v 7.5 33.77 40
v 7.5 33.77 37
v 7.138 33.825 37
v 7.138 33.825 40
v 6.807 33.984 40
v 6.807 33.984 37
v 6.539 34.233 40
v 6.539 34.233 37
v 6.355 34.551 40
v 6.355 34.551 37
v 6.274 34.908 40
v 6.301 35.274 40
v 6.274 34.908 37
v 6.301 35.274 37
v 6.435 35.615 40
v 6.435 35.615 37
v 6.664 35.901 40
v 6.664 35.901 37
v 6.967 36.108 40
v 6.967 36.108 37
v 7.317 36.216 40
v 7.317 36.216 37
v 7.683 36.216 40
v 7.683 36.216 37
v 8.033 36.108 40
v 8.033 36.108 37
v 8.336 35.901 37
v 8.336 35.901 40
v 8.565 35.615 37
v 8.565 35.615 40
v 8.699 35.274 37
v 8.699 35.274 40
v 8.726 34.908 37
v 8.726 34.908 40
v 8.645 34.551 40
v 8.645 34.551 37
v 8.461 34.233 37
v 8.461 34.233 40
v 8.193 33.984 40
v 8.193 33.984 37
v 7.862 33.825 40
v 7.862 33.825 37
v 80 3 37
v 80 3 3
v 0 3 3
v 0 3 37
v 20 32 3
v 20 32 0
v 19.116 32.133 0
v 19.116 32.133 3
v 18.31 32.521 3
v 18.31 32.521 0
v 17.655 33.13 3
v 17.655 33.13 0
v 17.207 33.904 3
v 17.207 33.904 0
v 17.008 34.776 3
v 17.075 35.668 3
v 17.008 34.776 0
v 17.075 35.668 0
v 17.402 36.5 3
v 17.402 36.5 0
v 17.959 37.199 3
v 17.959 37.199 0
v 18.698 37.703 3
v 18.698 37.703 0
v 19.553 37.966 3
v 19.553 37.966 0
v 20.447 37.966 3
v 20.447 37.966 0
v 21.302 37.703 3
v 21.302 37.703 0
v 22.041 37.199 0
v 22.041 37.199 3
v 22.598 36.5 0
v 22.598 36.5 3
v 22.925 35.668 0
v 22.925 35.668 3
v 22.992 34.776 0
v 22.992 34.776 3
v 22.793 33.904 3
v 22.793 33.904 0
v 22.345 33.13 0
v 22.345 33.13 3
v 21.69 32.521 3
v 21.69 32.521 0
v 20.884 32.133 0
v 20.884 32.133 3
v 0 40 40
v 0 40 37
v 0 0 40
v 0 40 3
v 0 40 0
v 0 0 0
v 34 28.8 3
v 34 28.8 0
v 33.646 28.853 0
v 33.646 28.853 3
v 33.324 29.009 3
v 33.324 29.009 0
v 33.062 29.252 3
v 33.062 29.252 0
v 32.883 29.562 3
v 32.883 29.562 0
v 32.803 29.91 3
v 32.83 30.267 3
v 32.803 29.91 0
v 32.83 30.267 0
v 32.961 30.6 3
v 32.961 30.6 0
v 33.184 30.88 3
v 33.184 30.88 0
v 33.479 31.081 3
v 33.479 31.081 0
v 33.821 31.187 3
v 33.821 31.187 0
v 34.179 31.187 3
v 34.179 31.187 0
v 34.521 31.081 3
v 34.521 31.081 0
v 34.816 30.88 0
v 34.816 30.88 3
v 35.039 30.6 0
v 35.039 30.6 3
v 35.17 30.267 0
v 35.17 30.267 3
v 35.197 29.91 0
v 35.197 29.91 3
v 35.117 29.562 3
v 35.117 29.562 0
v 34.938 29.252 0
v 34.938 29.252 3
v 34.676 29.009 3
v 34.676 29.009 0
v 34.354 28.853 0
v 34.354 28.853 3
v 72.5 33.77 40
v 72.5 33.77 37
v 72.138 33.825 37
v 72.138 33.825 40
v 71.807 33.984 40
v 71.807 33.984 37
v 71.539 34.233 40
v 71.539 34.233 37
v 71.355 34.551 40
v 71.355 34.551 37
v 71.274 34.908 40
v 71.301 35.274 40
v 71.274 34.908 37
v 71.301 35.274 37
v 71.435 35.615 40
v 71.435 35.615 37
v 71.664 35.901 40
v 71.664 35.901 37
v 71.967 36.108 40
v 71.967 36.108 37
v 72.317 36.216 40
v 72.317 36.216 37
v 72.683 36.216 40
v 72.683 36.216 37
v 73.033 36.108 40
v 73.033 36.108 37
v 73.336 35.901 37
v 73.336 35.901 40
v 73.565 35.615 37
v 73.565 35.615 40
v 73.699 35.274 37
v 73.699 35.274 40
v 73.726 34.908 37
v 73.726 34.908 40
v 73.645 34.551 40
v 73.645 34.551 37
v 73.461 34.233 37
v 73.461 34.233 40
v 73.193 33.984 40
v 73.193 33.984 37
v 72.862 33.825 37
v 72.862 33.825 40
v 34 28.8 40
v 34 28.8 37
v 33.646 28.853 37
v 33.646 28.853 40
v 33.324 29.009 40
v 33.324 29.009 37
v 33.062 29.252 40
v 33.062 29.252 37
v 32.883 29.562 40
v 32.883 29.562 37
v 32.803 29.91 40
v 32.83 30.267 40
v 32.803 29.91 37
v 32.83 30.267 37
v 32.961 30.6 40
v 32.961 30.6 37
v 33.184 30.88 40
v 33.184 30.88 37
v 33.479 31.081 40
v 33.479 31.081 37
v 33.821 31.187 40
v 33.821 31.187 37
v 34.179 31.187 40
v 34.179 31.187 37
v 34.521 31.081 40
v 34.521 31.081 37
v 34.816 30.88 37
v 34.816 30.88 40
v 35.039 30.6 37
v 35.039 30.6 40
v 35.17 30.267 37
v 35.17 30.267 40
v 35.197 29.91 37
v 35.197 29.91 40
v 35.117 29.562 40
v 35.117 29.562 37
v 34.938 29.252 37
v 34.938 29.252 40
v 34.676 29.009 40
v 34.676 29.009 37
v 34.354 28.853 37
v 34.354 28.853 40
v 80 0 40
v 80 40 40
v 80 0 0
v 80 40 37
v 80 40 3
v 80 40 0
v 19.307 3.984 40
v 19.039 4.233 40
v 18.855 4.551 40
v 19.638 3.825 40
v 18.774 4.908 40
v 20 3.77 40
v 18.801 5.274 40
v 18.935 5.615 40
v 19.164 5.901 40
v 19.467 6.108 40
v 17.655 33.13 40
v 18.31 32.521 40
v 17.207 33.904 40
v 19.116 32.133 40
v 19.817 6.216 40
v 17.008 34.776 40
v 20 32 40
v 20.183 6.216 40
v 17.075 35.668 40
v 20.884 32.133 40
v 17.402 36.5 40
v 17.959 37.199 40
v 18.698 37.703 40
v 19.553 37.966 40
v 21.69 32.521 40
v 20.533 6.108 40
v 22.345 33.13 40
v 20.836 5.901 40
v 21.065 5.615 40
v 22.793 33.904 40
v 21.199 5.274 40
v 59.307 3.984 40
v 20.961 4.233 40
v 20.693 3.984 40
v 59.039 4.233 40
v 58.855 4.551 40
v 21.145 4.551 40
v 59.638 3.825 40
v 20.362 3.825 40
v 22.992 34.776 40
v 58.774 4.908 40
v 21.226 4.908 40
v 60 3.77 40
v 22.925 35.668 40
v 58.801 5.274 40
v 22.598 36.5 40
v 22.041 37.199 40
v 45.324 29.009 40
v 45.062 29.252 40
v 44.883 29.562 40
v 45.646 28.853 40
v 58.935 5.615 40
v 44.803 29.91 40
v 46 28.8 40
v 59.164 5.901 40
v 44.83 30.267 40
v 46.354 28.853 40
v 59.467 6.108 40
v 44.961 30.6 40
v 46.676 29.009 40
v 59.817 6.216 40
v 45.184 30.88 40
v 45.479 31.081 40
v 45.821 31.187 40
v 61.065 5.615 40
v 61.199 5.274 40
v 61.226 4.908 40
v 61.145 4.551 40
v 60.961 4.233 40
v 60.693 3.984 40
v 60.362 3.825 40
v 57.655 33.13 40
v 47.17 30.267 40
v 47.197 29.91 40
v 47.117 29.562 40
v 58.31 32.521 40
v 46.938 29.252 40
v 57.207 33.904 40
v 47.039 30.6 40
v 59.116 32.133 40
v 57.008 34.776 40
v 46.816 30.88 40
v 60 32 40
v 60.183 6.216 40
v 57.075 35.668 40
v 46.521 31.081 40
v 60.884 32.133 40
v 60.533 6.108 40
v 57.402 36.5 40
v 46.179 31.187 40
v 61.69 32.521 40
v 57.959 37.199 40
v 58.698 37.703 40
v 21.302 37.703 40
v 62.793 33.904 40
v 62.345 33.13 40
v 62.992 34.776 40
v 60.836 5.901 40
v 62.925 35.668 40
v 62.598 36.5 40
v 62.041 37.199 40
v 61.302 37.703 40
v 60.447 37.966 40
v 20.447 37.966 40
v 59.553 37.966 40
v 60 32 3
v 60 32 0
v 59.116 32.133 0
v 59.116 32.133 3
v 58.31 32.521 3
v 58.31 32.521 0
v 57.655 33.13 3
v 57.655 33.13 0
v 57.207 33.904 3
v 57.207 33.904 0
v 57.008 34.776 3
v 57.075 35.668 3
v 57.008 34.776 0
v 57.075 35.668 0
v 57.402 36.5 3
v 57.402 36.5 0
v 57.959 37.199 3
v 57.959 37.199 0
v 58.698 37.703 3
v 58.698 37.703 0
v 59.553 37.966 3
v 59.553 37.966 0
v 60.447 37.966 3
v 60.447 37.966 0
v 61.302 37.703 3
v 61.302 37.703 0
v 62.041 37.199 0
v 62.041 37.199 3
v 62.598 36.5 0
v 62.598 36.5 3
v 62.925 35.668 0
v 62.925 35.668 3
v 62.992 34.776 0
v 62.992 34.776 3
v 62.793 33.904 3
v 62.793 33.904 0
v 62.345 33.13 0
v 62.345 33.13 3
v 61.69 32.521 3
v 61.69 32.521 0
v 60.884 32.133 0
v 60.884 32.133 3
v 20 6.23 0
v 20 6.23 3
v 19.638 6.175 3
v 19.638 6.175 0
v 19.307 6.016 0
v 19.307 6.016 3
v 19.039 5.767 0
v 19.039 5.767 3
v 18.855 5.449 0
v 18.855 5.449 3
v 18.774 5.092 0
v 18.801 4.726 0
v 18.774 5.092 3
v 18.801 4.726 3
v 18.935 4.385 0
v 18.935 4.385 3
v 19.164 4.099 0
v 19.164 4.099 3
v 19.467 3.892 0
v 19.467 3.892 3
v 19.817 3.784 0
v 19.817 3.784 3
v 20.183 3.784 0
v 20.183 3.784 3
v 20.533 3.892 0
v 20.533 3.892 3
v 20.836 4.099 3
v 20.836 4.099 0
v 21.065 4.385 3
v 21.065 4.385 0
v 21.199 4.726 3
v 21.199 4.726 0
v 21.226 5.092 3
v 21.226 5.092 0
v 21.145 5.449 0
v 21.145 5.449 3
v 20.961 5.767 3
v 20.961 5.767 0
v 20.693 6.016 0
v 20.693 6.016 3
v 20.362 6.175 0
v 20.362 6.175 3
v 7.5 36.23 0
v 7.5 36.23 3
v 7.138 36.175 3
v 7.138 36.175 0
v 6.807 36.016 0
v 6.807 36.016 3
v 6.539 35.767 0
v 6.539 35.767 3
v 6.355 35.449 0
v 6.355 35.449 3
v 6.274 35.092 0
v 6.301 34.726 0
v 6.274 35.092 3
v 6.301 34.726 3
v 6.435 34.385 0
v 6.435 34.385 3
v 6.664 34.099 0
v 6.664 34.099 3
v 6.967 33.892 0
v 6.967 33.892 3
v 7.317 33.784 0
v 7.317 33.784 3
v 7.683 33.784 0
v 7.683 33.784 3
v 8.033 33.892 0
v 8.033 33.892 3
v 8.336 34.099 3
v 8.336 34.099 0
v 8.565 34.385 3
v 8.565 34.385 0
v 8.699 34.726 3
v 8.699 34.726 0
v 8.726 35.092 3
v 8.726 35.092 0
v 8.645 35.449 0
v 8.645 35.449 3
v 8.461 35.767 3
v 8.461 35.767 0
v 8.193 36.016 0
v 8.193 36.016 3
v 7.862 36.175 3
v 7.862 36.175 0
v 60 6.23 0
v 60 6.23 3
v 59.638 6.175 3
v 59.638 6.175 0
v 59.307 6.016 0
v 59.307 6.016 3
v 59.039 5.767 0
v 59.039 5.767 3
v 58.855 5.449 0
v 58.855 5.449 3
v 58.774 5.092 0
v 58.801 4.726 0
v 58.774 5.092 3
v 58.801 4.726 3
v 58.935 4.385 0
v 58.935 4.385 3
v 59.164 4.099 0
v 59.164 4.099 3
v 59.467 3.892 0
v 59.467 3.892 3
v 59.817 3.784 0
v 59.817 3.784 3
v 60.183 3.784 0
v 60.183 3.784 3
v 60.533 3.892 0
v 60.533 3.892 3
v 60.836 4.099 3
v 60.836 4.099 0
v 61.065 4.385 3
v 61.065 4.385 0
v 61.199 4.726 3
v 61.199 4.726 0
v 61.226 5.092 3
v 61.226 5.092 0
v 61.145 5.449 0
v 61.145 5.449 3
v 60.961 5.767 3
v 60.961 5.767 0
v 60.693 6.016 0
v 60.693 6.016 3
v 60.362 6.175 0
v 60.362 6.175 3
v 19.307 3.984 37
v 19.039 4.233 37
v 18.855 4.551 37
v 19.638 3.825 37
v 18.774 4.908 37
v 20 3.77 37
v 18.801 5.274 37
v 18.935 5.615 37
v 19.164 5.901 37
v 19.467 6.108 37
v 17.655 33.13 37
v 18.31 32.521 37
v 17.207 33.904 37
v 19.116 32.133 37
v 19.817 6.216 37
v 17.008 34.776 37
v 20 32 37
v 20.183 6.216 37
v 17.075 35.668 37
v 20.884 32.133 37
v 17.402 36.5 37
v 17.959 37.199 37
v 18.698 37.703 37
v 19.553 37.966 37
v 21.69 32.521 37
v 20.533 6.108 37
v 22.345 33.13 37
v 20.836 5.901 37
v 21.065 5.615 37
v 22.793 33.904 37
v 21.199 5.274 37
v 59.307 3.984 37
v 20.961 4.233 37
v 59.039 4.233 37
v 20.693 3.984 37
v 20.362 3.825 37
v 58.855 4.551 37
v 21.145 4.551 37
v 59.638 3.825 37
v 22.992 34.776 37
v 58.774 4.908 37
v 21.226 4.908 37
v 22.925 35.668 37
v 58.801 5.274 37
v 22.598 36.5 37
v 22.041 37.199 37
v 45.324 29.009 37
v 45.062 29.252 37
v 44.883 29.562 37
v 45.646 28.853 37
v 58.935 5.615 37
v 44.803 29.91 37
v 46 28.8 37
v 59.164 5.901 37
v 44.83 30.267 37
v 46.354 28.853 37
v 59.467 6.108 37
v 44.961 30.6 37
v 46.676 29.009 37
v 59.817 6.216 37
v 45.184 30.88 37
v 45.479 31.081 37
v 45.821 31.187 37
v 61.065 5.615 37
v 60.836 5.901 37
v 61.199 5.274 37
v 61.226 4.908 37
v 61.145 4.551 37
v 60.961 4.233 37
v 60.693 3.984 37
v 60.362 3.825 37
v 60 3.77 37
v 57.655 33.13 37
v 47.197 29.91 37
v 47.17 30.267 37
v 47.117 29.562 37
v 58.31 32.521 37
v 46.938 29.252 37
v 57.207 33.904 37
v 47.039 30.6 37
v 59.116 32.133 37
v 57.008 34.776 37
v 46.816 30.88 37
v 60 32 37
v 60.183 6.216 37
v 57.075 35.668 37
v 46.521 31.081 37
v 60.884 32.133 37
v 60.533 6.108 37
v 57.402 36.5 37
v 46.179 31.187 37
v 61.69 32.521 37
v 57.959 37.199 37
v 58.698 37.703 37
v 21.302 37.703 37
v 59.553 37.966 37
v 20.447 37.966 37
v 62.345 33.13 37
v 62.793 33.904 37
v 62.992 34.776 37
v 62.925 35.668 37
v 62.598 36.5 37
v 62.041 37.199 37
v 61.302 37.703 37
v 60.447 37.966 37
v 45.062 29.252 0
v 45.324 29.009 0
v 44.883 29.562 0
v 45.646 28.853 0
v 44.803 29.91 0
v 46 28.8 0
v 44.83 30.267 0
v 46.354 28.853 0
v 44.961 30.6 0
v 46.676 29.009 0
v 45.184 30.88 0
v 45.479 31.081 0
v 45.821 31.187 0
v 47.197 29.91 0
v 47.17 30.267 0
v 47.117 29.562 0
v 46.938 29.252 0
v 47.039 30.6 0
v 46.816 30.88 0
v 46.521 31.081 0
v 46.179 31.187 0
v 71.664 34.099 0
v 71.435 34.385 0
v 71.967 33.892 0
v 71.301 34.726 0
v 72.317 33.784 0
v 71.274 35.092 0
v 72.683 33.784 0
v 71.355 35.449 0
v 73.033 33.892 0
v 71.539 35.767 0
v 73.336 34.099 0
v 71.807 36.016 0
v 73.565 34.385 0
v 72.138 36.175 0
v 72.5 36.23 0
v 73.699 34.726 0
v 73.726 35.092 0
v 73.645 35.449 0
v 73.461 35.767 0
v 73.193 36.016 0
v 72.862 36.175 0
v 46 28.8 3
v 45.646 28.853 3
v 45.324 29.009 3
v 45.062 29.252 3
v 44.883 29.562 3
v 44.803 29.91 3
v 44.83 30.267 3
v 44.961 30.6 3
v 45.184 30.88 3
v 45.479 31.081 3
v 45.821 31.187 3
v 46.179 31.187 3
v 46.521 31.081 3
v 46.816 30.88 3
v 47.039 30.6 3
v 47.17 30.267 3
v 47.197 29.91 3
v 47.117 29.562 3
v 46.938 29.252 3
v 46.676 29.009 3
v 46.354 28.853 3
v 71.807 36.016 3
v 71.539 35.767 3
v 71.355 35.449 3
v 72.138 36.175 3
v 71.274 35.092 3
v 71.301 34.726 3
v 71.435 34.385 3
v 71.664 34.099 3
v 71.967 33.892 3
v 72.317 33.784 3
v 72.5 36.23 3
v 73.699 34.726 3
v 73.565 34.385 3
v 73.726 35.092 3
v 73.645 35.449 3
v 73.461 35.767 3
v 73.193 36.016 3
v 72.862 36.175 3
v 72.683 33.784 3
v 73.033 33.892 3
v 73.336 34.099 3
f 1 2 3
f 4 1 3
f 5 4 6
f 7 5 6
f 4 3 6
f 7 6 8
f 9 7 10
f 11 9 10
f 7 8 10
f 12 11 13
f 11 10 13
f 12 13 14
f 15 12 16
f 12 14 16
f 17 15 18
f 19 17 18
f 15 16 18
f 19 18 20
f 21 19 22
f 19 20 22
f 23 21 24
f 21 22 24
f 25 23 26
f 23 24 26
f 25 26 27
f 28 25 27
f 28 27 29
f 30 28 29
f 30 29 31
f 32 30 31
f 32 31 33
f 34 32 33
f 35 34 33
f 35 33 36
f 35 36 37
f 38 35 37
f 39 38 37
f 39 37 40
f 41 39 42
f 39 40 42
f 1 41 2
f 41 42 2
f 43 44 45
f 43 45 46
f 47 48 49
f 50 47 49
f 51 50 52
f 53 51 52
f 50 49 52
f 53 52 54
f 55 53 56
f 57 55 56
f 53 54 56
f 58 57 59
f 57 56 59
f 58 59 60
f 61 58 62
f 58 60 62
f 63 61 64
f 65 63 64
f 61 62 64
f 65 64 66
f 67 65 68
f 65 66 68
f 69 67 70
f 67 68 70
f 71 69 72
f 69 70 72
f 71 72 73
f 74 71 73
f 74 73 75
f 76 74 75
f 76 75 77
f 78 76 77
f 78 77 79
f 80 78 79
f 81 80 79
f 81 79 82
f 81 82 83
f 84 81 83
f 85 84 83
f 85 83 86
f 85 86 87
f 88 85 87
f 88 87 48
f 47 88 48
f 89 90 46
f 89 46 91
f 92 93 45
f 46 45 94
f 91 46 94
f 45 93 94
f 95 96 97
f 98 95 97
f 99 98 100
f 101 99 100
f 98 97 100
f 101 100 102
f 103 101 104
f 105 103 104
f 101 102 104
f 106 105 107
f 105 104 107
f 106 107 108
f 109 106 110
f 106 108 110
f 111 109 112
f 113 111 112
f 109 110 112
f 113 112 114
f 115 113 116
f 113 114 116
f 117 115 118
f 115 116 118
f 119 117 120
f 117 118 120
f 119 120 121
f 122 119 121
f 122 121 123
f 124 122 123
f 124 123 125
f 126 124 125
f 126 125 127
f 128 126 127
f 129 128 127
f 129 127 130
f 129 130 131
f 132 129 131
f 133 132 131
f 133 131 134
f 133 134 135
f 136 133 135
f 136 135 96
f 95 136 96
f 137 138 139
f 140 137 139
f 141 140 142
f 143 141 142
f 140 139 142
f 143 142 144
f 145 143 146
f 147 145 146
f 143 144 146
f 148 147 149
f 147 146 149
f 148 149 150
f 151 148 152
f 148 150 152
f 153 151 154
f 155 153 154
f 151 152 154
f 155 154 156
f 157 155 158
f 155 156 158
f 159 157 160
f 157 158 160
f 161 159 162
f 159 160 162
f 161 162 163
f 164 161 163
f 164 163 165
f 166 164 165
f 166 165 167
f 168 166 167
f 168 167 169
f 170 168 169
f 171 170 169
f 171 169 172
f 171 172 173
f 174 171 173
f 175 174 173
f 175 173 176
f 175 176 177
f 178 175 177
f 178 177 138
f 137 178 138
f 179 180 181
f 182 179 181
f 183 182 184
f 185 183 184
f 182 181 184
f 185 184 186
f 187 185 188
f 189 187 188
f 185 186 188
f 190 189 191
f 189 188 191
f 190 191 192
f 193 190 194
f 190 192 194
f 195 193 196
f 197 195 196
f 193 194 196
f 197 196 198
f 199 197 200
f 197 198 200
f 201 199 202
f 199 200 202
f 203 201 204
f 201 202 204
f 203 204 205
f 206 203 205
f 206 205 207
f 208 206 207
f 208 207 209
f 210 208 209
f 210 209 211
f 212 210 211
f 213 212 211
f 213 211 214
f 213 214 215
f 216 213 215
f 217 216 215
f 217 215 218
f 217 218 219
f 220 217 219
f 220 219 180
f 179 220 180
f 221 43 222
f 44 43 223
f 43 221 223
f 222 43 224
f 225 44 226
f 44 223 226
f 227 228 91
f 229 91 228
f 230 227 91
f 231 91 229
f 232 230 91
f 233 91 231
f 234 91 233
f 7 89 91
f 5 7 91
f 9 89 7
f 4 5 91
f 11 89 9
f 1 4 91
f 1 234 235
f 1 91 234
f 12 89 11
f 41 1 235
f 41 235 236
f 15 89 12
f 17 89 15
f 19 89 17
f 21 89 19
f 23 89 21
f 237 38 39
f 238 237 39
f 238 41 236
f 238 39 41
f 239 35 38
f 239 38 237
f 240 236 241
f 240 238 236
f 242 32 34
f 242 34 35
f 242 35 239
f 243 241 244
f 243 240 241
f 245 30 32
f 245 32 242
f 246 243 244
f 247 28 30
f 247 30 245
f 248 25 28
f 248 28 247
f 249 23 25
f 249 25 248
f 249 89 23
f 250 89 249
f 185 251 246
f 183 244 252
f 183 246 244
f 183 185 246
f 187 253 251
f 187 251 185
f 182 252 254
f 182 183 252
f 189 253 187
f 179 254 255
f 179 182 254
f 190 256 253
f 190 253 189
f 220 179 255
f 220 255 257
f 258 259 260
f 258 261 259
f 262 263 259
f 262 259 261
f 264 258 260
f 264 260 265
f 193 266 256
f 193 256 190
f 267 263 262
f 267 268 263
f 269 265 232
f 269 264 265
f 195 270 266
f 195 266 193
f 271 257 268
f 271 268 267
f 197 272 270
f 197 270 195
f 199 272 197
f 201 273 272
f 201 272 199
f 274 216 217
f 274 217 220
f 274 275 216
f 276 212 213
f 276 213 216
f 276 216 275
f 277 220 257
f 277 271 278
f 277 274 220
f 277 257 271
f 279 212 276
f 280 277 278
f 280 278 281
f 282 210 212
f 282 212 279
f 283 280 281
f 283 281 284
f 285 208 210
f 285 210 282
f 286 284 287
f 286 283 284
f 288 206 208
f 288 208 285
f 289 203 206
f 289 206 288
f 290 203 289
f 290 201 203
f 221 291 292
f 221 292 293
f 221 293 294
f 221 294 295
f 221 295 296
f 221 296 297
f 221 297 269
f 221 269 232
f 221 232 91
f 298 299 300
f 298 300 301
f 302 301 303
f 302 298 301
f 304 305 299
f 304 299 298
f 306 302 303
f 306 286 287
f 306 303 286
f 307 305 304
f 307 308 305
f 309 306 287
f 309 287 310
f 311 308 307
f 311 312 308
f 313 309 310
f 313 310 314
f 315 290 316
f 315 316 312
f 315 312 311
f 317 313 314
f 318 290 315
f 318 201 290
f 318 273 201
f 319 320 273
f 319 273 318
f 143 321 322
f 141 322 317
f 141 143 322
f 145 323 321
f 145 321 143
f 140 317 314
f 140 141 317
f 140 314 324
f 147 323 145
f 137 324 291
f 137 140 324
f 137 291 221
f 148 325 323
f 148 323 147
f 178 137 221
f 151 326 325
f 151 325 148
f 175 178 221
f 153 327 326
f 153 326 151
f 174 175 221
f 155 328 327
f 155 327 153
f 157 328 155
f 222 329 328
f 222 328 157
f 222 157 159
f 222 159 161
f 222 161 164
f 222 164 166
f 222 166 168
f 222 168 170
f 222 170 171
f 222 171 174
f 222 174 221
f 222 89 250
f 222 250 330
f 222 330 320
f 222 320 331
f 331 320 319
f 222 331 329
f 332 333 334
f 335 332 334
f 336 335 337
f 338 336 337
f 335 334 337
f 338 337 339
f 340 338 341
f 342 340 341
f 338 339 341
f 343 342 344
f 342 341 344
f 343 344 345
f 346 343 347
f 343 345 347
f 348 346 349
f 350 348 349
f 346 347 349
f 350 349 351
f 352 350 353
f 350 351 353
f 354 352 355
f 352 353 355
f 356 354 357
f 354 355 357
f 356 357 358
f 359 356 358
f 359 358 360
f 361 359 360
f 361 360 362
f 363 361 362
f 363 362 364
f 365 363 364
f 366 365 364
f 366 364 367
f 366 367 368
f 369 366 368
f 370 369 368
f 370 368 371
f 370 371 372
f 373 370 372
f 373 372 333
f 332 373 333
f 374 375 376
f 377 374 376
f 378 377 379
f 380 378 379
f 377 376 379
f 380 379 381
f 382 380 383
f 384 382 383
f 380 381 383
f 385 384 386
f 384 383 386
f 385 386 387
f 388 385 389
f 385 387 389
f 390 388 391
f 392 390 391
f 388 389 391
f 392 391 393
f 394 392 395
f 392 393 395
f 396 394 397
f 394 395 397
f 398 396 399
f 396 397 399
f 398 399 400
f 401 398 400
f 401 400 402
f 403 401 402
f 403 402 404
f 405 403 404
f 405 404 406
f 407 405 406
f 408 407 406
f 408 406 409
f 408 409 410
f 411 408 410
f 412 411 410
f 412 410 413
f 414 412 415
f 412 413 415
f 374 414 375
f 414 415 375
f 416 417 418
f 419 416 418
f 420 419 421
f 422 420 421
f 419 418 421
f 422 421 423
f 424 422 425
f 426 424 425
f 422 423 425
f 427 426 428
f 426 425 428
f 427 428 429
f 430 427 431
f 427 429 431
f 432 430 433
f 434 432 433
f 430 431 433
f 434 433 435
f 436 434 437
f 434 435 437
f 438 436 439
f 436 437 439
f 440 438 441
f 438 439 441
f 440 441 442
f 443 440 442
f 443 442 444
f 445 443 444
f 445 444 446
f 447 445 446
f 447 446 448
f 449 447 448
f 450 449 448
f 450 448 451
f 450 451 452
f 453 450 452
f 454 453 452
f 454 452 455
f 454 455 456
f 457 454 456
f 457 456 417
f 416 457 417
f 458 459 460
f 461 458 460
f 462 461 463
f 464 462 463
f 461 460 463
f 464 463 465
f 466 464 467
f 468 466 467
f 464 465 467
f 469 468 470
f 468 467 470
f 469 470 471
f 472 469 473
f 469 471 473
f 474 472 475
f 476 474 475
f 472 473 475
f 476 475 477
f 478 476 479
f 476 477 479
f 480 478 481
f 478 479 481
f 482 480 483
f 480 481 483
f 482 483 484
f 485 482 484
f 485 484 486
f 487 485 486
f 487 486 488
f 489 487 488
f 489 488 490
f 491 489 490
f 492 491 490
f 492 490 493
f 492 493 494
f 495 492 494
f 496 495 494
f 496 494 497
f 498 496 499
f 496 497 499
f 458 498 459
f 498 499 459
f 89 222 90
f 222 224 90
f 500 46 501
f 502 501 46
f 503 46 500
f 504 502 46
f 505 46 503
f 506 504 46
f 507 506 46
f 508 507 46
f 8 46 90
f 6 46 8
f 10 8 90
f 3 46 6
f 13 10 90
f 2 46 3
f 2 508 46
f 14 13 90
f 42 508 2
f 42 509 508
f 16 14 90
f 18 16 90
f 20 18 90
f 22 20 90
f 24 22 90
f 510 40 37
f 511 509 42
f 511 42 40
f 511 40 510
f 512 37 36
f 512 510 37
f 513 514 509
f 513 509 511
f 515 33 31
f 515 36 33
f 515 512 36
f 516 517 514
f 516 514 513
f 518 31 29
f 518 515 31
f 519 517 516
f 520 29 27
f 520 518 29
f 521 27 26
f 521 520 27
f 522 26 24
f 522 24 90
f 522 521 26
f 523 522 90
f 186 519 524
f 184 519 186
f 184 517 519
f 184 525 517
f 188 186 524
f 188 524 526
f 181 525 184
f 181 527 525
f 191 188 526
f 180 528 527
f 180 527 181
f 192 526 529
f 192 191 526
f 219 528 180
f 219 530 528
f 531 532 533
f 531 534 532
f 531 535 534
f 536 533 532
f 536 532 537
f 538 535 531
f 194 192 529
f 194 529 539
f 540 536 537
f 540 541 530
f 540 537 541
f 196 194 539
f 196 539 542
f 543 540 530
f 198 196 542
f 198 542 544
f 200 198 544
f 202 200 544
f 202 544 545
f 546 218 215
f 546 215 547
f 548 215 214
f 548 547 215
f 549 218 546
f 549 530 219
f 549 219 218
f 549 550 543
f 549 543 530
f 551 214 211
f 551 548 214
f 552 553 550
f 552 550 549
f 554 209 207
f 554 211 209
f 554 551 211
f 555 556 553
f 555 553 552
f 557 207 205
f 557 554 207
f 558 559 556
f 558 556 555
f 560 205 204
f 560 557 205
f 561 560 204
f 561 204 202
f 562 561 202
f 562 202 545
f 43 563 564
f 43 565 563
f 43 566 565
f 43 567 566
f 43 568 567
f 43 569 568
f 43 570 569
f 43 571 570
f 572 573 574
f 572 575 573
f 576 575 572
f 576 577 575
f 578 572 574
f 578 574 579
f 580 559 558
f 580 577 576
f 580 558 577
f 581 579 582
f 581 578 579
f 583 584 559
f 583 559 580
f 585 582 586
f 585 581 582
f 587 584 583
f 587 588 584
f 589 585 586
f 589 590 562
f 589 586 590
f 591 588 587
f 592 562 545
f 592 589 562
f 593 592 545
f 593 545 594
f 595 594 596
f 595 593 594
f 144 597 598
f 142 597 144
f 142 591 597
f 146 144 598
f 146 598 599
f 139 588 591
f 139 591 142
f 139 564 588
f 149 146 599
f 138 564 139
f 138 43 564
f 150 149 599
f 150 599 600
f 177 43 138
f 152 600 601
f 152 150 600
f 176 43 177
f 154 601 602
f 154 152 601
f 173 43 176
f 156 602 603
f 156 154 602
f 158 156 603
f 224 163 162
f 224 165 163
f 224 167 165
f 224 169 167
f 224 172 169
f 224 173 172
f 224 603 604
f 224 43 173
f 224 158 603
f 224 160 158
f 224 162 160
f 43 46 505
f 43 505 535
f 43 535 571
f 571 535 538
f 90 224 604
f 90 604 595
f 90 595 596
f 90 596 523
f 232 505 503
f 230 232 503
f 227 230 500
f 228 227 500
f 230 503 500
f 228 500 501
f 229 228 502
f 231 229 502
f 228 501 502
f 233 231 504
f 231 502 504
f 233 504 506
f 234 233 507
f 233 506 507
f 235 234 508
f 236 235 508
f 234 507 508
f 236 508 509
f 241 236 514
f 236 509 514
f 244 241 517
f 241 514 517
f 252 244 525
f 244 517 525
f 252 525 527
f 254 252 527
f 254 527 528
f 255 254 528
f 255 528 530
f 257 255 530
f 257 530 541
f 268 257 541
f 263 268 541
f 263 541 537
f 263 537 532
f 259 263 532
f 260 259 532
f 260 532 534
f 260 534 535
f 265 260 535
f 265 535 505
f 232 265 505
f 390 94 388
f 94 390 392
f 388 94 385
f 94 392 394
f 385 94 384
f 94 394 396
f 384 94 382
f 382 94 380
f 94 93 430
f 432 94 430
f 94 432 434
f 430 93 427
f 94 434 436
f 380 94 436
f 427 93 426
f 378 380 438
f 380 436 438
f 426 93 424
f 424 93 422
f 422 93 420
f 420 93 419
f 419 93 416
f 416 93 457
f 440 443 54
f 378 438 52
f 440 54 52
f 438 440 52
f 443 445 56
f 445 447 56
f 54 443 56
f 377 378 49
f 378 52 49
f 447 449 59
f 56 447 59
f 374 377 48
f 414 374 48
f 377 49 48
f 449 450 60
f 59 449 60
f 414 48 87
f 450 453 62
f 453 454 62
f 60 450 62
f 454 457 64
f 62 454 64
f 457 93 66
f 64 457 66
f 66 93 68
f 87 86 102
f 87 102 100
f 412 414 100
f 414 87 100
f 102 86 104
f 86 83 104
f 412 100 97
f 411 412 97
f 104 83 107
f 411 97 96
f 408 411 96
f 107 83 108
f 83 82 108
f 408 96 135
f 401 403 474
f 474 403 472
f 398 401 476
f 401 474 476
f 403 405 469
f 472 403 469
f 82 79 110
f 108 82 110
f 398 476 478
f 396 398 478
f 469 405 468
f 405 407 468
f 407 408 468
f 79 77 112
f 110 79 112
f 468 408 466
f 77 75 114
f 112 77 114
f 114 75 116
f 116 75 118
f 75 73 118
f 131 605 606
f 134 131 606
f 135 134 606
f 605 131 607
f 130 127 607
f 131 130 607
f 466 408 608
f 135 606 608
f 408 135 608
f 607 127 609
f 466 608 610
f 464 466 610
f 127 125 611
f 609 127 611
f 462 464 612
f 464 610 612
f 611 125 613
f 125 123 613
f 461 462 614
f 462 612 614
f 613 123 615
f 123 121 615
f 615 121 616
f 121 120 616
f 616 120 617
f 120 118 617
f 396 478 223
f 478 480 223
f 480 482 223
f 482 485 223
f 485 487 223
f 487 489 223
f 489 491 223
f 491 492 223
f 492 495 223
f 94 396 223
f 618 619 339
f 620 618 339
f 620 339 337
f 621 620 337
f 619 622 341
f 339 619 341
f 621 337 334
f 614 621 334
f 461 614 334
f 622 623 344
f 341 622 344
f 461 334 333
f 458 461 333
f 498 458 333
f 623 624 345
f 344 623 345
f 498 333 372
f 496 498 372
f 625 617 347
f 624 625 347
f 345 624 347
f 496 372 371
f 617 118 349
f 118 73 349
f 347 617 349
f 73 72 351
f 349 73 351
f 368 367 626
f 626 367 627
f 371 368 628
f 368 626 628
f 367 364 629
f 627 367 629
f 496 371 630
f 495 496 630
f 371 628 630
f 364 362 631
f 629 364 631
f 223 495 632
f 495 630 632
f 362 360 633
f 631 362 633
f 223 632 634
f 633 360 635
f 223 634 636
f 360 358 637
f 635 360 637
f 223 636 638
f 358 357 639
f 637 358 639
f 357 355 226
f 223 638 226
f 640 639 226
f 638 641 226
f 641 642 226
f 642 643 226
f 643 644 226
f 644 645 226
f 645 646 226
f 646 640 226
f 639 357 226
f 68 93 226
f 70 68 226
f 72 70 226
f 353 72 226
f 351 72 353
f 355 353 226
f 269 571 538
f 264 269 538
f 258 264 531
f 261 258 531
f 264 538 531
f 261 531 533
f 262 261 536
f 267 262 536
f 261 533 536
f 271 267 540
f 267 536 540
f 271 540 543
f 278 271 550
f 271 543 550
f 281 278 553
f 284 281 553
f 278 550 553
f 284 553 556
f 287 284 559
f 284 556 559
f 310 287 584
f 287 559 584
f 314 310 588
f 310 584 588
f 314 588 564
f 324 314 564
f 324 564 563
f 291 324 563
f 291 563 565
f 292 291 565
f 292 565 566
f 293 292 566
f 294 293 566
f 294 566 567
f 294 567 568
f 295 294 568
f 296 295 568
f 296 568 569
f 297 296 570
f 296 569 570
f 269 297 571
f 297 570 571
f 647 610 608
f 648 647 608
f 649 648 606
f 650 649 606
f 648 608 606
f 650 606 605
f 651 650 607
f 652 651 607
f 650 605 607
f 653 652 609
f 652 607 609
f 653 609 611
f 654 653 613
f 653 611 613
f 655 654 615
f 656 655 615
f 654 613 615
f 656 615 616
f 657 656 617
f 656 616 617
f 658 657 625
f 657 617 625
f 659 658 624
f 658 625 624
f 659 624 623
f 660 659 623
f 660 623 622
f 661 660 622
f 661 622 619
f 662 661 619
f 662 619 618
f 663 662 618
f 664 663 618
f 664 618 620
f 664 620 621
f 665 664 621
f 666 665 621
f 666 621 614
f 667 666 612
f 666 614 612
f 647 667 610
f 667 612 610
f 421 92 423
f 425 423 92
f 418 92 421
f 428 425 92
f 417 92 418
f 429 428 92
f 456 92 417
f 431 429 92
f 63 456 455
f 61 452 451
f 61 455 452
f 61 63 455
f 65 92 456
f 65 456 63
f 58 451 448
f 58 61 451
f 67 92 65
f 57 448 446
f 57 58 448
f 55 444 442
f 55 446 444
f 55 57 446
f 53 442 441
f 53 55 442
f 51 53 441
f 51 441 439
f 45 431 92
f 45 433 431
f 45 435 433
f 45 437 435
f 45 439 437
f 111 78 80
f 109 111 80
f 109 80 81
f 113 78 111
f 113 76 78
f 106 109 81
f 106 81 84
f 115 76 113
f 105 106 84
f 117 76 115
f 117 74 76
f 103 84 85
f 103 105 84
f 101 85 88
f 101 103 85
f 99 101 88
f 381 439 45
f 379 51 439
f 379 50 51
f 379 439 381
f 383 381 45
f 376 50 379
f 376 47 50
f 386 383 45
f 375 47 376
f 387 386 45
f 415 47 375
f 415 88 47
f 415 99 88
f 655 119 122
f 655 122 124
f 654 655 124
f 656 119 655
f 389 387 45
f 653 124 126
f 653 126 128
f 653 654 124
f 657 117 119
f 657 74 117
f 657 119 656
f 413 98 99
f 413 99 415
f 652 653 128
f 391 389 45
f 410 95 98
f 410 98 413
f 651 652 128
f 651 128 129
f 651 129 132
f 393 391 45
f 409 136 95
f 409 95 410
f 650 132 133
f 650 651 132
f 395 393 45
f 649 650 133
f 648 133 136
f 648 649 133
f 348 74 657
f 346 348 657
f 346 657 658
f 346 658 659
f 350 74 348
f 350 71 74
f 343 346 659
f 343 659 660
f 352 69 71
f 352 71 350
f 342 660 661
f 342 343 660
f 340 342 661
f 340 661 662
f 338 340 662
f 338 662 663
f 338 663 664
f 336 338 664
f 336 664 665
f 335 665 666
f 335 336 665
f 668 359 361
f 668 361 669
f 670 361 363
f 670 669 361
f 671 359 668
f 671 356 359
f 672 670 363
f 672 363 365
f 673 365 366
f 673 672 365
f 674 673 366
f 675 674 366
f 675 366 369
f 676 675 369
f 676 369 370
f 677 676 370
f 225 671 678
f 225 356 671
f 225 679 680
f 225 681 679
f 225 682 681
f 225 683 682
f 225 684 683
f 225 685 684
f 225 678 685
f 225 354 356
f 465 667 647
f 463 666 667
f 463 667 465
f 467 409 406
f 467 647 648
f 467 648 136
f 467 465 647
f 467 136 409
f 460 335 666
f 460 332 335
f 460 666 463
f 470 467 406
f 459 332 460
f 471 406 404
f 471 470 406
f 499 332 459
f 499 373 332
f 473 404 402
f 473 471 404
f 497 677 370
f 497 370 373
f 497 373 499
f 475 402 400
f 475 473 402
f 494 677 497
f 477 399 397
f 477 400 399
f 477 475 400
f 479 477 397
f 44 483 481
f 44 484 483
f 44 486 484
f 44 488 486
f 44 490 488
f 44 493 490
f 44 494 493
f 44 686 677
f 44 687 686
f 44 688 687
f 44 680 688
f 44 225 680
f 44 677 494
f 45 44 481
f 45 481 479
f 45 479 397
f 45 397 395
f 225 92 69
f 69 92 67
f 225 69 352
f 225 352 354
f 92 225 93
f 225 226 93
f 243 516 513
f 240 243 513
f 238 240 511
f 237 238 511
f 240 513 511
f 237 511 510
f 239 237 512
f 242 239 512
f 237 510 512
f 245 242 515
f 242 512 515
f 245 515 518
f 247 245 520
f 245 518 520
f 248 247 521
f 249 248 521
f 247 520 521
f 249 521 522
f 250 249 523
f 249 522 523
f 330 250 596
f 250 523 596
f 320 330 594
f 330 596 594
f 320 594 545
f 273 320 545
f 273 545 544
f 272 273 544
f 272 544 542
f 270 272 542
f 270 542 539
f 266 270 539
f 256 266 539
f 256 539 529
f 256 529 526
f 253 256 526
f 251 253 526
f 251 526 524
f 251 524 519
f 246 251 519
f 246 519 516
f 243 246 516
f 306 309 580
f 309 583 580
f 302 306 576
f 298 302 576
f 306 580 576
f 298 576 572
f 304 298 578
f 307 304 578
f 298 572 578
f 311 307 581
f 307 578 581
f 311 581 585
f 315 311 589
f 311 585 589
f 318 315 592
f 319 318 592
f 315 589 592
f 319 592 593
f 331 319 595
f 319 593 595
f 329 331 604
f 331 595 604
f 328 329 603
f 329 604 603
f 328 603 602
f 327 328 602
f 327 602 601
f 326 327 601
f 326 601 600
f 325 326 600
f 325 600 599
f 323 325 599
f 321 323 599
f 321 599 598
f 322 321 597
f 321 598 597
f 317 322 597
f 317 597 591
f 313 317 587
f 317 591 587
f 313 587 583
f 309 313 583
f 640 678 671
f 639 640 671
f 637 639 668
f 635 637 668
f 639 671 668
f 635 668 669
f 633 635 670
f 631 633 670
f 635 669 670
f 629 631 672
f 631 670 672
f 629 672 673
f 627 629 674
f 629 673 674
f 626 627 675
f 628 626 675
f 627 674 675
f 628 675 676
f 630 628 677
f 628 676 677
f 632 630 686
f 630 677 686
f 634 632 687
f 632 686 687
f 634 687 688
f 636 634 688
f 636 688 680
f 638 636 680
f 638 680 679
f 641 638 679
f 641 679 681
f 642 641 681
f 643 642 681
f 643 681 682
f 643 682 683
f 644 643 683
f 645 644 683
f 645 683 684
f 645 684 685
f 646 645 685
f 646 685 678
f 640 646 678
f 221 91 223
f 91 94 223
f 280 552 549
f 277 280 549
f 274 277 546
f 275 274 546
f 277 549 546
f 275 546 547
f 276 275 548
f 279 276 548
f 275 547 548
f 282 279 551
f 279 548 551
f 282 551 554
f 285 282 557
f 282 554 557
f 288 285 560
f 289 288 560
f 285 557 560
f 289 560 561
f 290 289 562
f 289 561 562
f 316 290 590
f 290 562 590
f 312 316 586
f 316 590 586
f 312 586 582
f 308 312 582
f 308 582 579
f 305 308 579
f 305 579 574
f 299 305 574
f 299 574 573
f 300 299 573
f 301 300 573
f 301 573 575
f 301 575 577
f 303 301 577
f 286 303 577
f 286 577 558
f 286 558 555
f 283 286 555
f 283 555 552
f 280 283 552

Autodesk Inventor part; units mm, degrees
ref_plane "YZ Plane" through (0, 0, 0) normal (1, 0, 0) x (0, 1, 0)
ref_plane "XZ Plane" through (0, 0, 0) normal (0, 1, 0) x (-1, 0, 0)
ref_plane "XY Plane" through (0, 0, 0) normal (0, 0, 1) x (1, 0, 0)
sketch "スケッチ1" plane through (0, 0, 0) normal (0, 0, 1) x (1, 0, 0)
  line L0 (0, 0) -> (80, 0)
  line L1 (80, 0) -> (80, 40)
  line L2 (80, 40) -> (0, 40)
  line L3 (0, 40) -> (0, 0)
  dimension "d0" = 80
  dimension "d1" = 40
extrude "押し出し1" add sketch "スケッチ1" along normal blind 40
sketch "スケッチ2" plane through (80, 0, 0) normal (1, 0, 0) x (0, 0, -1)
  line L0 (0, 40) -> (-40, 40) projected
  line L1 (-37, 40) -> (-3, 40)
  line L2 (-3, 40) -> (-3, 3)
  line L3 (-3, 3) -> (-37, 3)
  line L4 (-37, 3) -> (-37, 40)
  line L5 (-40, 0) -> (-40, 40) projected
  line L6 (0, 0) -> (0, 40) projected
  line L7 (0, 0) -> (-40, 0) projected
  dimension "d4" = 3
  dimension "d5" = 3
  dimension "d6" = 3
extrude "押し出し2" cut sketch "スケッチ2" against normal through all contours L2 L3 L4 L0
sketch "スケッチ3" plane through (0, 0, 40) normal (0, 0, 1) x (1, 0, 0)
  line L0 (0, 40) -> (80, 40) projected
  line L1 (40, 40) -> (40, 0)
  point P0 (0, 0)
  point P1 (20, 35)
  point P2 (60, 35)
  dimension "d9" = 5
  dimension "d10" = 20
hole "穴1" at (20, 35, 40) at (60, 35, 40) direction (0, 0, -1) diameter 6 end through all
sketch "スケッチ4" plane through (0, 0, 40) normal (0, 0, 1) x (1, 0, 0)
  line L0 (0, 40) -> (80, 40) projected
  line L1 (40, 40) -> (40, 0)
  point P0 (0, 0)
  point P1 (34, 30)
  point P2 (46, 30)
  dimension "d18" = 6
  dimension "d19" = 10
hole "穴2" at (34, 30, 40) at (46, 30, 40) direction (0, 0, -1) diameter 2.4 end through all clearance for "Countersunk Flat Head Screw ISO 2009/7046" size "M2" standard "ISO"
sketch "スケッチ5" plane through (0, 0, 0) normal (0, -1, 0) x (1, 0, 0)
  line L0 (80, 40) -> (0, 40) projected
  line L1 (40, 40) -> (40, 10)
  point P0 (0, 0)
sketch "スケッチ6" plane through (0, 0, 40) normal (0, 0, 1) x (1, 0, 0)
  line L0 (80, 40) -> (0, 40) projected
  line L1 (40, 40) -> (40, 0)
  line L2 (0, 0) -> (80, 0) projected
  circle A0 centre (20, 35) radius 3 projected
  point P0 (20, 5)
  point P1 (60, 5)
  dimension "d27" = 20
  dimension "d28" = 30
hole "穴3" at (20, 5, 40) at (60, 5, 40) direction (0, 0, -1) diameter 2.459 depth 3 thread size "M3x0.5" class "6H" standard "ISO Metric profile"
sketch "スケッチ7" plane through (0, 0, 0) normal (0, 0, -1) x (-1, 0, 0)
  line L0 (-80, 40) -> (0, 40) projected
  line L1 (-40, 40) -> (-40, 0)
  line L2 (0, 0) -> (-80, 0) projected
  circle A0 centre (-60, 35) radius 3 projected
  point P0 (-60, 5)
  point P1 (-20, 5)
  dimension "d36" = 20
  dimension "d37" = 30
hole "穴4" at (60, 5, 0) at (20, 5, 0) direction (0, 0, 1) diameter 2.459 depth 3 thread size "M3x0.5" class "6H" standard "ISO Metric profile"
sketch "スケッチ8" plane through (0, 0, 0) normal (0, 0, -1) x (-1, 0, 0)
  line L0 (-80, 40) -> (0, 40) projected
  line L1 (-40, 40) -> (-40, 3)
  line L2 (-80, 3) -> (0, 3) projected
  point P0 (0, 0)
  point P1 (-72.5, 35)
  point P2 (-7.5, 35)
  dimension "d45" = 5
  dimension "d46" = 32.5
hole "穴5" at (72.5, 35, 0) at (7.5, 35, 0) direction (0, 0, 1) diameter 2.459 depth 3 thread size "M3x0.5" class "6H" standard "ISO Metric profile"
sketch "スケッチ9" plane through (0, 0, 40) normal (0, 0, 1) x (1, 0, 0)
  circle A0 centre (7.5, 35) radius 1.2295 projected
  circle A1 centre (72.5, 35) radius 1.2295 projected
  point P0 (0, 0)
hole "穴6" at (7.5, 35, 40) at (72.5, 35, 40) direction (0, 0, -1) diameter 2.459 depth 3 thread size "M3x0.5" class "6H" standard "ISO Metric profile"
properties part number "シリンダーボックス"
